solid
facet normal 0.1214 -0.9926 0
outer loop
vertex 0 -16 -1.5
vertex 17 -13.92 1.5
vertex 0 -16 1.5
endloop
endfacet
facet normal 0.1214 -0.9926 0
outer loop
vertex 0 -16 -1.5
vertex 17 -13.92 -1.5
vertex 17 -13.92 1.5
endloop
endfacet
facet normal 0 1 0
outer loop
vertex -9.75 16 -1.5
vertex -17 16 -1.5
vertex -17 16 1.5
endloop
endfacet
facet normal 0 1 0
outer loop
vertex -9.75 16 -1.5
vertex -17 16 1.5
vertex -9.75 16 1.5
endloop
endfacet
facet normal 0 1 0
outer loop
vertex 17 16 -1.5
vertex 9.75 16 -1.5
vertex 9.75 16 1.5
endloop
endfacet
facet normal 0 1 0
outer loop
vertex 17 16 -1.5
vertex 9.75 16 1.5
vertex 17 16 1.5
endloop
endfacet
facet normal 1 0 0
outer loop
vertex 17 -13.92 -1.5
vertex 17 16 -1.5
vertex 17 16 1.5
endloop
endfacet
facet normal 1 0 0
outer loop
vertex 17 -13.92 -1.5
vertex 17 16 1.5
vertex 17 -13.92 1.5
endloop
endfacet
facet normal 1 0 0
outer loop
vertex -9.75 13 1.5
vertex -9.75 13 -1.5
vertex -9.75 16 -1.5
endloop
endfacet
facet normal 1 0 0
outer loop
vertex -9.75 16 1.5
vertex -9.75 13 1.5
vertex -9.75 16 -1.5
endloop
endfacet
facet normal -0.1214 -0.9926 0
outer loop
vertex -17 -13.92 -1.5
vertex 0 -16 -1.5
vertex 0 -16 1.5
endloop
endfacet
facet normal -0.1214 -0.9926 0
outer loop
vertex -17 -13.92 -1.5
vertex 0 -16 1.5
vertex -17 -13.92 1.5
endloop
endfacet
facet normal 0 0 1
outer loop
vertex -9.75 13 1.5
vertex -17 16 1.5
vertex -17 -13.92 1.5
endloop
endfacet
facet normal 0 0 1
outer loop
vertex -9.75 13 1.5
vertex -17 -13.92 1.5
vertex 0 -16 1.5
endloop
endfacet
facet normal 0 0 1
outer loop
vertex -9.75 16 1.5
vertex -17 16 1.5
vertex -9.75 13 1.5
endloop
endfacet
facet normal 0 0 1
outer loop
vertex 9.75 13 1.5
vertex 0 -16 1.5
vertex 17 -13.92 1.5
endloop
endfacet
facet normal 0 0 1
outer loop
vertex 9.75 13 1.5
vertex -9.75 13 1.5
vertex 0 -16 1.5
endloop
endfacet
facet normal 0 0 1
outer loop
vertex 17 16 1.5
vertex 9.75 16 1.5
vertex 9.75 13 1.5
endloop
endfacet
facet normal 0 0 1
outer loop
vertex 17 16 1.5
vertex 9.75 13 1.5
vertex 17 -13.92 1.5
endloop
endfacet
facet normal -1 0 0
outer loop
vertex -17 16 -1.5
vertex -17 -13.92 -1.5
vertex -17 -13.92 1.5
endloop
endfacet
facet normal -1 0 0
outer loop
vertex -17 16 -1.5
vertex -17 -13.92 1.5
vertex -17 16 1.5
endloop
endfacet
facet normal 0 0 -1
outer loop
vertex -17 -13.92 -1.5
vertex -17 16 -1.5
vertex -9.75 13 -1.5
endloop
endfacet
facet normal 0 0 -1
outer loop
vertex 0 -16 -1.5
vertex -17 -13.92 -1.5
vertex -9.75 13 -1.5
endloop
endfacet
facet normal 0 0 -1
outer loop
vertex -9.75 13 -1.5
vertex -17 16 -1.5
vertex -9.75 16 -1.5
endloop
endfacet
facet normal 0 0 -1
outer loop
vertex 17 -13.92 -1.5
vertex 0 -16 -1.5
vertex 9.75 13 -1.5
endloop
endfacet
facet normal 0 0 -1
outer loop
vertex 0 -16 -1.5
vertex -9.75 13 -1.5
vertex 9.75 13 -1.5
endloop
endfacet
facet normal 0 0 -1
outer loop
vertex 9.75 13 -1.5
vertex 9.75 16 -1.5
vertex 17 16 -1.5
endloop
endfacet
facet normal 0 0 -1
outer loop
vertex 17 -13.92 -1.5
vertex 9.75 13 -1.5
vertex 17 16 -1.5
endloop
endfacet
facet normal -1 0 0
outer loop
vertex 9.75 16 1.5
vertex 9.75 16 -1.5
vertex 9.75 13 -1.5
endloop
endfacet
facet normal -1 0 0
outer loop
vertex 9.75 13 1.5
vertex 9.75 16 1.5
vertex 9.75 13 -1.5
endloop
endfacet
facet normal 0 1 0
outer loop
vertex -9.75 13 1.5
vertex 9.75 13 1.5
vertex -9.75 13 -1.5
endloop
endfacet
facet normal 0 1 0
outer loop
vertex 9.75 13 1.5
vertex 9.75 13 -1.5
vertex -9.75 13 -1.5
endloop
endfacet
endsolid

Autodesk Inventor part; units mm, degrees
ref_plane "YZ Plane" through (0, 0, 0) normal (1, 0, 0) x (0, 1, 0)
ref_plane "XZ Plane" through (0, 0, 0) normal (0, 1, 0) x (-1, 0, 0)
ref_plane "XY Plane" through (0, 0, 0) normal (0, 0, 1) x (1, 0, 0)
sketch "Sketch1" plane through (0, 0, 0) normal (0, 0, 1) x (1, 0, 0)
  line L0 (-17, 16) -> (17, 16)
  line L1 (17, 16) -> (17, -16)
  line L2 (17, -16) -> (-17, -16)
  line L3 (-17, -16) -> (-17, 16)
  line L4 (-9.75, 16) -> (9.75, 16)
  line L5 (9.75, 16) -> (9.75, 13)
  line L6 (9.75, 13) -> (-9.75, 13)
  line L7 (-9.75, 13) -> (-9.75, 16)
  line L8 (0, -16) -> (0, -13.92)
  line L9 (17, -13.92) -> (0, -16)
  line L10 (0, -16) -> (-17, -13.92)
  point P0 (0, 0)
  point P1 (17, 0)
  point P2 (0, 16)
  point P3 (9.75, 16)
  dimension "d0" = 34
  dimension "d1" = 32
  dimension "d3" = 2.08
  dimension "d6" = 19.5
  dimension "d7" = 3
extrude "Extrusion1" add sketch "Sketch1" along normal mid plane 3 contours L0 L7 L6 L5 L1 L9 L10 L3
properties part number "A"
